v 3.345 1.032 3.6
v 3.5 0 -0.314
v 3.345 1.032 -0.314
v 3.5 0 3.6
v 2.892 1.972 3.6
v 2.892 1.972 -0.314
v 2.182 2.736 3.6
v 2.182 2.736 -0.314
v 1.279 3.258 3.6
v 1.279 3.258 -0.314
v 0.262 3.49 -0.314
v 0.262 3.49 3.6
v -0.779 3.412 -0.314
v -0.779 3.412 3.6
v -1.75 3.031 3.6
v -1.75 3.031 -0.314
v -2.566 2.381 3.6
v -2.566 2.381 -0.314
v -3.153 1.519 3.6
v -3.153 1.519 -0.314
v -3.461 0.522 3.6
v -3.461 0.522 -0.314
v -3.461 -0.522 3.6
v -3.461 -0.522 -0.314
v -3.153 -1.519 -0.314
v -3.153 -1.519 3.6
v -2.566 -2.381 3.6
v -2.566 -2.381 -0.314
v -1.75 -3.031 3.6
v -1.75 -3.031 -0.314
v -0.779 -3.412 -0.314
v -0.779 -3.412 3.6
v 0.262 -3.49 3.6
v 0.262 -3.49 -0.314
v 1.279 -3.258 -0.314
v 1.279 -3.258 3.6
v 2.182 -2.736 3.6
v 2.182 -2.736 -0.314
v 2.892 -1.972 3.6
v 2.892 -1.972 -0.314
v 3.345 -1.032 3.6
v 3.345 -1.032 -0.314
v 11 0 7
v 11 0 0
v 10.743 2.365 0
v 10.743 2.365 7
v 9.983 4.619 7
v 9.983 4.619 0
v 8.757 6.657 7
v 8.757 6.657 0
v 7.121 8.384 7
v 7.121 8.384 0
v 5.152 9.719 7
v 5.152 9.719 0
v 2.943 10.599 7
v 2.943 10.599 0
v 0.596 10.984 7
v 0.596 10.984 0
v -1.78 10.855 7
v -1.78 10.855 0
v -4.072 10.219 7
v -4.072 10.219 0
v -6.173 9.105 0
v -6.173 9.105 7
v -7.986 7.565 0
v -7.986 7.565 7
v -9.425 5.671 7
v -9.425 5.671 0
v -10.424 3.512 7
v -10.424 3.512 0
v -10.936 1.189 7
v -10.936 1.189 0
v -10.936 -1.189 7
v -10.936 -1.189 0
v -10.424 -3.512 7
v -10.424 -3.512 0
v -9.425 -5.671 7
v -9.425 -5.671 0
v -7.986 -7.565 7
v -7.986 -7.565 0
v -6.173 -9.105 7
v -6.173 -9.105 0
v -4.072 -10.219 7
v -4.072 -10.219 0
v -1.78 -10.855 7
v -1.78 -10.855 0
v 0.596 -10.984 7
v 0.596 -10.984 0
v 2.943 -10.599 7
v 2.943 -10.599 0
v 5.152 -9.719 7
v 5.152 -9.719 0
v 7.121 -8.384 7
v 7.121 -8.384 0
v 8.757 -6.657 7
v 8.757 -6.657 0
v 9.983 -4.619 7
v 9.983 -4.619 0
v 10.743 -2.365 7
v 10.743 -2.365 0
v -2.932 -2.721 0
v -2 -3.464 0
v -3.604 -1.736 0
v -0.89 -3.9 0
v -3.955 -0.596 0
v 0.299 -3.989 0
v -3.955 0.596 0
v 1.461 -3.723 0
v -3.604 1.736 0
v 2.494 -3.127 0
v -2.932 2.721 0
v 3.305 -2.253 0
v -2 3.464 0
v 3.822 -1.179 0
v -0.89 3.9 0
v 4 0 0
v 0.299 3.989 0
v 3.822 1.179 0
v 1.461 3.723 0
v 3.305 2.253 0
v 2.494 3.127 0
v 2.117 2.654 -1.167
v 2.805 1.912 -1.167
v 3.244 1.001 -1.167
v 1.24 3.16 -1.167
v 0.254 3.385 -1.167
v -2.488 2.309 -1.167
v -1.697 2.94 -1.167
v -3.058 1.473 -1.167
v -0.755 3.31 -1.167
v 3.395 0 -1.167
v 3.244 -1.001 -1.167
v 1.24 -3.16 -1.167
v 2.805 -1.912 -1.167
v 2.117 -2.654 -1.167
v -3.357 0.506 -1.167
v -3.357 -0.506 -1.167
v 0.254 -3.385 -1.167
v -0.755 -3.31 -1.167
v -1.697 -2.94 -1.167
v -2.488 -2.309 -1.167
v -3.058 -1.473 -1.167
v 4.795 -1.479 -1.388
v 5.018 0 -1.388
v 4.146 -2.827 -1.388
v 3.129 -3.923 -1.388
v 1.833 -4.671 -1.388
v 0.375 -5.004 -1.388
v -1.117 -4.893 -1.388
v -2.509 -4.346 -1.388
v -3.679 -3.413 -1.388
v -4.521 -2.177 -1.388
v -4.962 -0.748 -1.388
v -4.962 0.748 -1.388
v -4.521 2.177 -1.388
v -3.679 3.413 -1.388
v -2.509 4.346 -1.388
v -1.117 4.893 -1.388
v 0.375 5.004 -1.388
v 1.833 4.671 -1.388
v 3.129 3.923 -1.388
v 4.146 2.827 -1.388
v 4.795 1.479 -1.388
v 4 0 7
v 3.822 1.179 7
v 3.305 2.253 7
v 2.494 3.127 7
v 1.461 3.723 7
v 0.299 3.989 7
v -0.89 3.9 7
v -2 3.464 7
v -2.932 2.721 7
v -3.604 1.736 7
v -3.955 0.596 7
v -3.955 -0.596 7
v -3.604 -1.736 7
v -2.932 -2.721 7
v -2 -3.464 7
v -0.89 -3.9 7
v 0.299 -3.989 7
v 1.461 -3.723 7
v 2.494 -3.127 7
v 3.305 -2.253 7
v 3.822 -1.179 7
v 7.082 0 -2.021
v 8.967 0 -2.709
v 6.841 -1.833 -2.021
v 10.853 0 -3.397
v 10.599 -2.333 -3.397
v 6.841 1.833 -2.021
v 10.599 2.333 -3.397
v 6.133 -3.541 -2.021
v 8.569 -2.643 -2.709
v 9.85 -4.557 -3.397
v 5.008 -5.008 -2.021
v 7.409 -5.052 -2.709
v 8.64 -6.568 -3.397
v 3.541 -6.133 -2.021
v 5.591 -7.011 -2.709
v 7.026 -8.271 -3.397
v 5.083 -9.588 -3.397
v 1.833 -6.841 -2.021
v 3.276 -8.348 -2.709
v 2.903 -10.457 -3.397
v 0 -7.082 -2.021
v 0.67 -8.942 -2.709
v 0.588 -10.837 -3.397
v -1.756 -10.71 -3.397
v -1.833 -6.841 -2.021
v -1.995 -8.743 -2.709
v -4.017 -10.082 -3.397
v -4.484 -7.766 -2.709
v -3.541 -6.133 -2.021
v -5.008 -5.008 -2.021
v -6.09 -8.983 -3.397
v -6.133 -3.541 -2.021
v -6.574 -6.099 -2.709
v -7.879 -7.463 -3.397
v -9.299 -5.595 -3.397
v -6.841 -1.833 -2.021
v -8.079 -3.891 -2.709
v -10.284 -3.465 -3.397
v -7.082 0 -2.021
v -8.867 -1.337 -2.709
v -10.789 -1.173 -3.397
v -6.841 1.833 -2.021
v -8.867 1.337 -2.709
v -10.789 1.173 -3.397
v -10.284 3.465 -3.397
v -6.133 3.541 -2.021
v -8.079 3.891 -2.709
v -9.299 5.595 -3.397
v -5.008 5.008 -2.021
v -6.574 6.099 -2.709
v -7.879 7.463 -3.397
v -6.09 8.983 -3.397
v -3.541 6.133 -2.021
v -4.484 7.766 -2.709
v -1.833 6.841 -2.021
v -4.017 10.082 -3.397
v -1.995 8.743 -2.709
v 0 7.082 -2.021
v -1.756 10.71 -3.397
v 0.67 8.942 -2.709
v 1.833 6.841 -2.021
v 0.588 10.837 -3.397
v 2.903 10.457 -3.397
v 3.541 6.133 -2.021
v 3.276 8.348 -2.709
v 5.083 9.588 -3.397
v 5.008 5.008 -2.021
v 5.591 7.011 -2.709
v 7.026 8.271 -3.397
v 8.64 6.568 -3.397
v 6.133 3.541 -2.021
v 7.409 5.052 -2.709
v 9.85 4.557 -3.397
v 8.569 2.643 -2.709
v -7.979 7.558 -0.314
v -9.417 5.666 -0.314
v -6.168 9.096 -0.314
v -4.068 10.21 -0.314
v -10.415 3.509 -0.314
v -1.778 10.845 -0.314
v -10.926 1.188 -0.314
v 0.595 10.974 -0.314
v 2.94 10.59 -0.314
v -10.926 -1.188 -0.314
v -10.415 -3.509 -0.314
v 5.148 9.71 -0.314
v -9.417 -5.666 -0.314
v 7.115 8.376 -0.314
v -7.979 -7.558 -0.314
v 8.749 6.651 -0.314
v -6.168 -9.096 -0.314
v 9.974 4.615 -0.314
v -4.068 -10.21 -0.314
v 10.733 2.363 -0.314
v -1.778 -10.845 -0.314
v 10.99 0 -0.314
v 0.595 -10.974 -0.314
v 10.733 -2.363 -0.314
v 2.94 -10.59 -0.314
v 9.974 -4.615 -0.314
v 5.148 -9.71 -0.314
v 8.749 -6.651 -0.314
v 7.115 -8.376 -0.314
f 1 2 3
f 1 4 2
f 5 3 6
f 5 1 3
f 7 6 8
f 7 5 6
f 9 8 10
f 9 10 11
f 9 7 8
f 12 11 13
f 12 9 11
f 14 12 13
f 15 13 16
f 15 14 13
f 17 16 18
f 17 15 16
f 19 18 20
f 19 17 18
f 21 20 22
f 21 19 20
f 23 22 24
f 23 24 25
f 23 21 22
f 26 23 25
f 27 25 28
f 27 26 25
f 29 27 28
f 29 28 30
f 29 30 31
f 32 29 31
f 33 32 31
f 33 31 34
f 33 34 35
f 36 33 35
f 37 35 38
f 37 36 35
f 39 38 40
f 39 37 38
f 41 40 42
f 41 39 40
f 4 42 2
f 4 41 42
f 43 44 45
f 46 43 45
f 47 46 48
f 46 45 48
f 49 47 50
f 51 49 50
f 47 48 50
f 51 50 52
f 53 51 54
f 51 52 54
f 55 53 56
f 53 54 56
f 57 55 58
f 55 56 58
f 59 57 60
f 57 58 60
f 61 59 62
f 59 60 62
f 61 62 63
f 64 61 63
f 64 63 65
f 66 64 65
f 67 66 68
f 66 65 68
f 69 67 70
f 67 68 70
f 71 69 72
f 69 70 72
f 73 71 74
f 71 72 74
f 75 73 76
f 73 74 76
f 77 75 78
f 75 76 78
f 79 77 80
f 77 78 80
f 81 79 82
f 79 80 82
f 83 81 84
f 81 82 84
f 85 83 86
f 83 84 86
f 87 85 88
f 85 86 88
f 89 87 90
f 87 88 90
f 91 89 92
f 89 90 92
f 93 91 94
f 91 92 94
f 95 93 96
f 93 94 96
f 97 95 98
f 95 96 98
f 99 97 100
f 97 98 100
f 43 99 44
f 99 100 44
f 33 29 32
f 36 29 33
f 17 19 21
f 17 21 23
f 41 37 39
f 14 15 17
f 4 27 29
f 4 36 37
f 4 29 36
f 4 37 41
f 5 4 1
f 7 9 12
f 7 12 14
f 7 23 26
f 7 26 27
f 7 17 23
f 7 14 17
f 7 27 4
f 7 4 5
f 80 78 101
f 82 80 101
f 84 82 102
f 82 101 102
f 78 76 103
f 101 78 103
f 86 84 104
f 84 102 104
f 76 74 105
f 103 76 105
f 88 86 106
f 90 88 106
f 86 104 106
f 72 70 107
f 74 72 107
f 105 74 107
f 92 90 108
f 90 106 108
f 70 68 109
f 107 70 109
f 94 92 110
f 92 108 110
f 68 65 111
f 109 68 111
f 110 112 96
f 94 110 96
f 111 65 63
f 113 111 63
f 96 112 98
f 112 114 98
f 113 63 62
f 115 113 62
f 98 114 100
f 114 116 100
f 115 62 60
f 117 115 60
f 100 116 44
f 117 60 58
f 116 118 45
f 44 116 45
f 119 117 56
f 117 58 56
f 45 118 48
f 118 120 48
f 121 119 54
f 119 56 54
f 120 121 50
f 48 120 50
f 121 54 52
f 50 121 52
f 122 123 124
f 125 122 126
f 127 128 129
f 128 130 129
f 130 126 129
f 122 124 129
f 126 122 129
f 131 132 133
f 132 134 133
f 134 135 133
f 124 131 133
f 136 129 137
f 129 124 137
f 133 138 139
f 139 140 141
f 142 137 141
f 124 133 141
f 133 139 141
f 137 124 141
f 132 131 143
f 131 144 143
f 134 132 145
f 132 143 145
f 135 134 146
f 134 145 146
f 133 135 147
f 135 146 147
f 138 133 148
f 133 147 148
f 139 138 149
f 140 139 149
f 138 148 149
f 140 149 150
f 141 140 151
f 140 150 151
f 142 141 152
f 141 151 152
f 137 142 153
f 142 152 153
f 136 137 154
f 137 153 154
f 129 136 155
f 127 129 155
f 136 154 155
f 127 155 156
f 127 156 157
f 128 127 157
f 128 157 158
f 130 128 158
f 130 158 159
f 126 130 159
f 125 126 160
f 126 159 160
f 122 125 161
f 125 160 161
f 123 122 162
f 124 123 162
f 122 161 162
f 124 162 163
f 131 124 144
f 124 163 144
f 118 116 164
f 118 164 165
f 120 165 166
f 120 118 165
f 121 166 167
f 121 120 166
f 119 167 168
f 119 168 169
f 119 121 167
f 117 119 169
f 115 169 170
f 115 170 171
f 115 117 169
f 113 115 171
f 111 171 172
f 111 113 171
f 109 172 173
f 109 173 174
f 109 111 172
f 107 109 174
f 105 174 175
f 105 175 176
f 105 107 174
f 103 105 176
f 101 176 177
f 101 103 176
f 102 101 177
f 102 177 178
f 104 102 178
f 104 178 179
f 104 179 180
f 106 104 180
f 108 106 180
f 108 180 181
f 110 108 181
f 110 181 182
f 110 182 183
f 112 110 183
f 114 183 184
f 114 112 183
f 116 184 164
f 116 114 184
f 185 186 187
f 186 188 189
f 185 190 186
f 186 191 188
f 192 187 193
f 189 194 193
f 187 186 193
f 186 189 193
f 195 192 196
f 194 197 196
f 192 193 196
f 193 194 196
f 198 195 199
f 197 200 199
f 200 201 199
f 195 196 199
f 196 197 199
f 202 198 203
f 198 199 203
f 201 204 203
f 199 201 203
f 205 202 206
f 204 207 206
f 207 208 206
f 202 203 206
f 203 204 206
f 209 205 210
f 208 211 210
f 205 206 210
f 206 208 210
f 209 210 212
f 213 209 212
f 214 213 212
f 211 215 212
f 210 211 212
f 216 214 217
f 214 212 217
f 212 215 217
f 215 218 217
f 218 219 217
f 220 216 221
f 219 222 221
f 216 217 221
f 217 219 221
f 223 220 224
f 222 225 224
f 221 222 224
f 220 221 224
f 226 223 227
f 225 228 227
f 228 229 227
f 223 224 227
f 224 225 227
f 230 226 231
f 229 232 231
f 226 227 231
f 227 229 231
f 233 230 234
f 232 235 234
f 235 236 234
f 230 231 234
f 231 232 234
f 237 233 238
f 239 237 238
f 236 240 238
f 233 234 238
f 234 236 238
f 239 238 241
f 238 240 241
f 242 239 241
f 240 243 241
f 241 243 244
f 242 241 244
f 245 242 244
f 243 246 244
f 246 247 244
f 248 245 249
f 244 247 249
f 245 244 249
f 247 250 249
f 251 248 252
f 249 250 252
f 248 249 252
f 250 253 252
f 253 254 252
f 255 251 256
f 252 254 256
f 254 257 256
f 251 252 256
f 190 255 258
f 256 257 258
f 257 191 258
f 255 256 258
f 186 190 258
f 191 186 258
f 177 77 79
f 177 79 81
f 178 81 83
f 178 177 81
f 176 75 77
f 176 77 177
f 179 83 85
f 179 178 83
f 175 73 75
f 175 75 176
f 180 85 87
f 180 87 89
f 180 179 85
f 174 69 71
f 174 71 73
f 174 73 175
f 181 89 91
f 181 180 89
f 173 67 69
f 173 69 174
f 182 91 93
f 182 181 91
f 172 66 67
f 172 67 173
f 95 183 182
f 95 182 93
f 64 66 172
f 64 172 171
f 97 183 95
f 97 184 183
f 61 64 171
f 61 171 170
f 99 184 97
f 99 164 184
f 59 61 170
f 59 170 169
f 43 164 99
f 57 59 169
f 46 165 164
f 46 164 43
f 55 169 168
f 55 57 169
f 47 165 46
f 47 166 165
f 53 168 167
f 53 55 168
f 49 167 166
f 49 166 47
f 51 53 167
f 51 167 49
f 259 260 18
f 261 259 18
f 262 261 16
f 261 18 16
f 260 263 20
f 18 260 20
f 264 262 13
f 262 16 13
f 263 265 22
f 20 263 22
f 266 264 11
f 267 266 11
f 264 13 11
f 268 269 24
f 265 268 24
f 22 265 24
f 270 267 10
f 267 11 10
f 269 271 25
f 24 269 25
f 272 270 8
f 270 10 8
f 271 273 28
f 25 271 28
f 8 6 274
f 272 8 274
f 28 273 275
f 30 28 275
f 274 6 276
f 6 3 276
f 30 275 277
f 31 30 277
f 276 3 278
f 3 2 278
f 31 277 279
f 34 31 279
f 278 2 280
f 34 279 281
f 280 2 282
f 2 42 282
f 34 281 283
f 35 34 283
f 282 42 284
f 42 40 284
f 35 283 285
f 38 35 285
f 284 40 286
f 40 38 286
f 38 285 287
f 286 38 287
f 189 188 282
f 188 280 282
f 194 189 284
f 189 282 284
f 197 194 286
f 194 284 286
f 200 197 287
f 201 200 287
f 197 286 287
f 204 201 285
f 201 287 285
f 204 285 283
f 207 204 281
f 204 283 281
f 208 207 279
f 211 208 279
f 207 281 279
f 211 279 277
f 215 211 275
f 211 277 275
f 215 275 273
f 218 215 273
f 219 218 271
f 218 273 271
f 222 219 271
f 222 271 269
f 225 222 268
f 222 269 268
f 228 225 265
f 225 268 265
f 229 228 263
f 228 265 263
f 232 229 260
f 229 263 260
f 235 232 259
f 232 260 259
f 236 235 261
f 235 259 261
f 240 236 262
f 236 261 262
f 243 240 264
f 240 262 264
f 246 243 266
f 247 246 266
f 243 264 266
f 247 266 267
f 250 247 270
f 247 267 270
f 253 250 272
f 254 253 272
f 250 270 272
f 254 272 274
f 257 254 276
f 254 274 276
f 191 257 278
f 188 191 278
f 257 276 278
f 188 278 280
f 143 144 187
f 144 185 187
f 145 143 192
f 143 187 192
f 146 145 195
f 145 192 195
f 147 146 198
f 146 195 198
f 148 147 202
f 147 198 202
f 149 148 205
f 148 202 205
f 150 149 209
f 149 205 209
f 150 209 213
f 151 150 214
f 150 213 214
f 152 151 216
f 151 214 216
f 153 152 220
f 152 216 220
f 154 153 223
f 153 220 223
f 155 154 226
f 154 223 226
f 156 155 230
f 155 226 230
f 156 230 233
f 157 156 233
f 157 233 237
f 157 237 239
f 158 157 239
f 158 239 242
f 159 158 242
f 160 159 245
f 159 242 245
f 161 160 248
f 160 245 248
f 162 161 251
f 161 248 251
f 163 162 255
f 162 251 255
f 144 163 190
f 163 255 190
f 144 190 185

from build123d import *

# Parameters (mm, degrees)
F0_R      = 11
F0_R_2    = 4
F1_DEPTH  = 7
F2_R      = 40
F2_R_2    = 11.5
F3_DEPTH  = 7
F4_R      = 11.5
F5_DEPTH  = 25
F7_R      = 3.5
F8_DEPTH  = 3.6
F11_DEPTH = 4.81
F13_DEPTH = 1


with BuildPart() as f1:
    # F0 (on Top) → F1 (new body)
    with BuildSketch(Plane.XY):
        Circle(F0_R)
        Circle(F0_R_2, mode=Mode.SUBTRACT)
    extrude(amount=F1_DEPTH)


with BuildPart() as f3:
    # F2 (on Top) → F3 (new body)
    with BuildSketch(Plane.XY):
        Circle(F2_R)
        Circle(F2_R_2, mode=Mode.SUBTRACT)
    extrude(amount=F3_DEPTH)

    # F4 (on face) → F5 (cut)
    with BuildSketch(Plane.XY.offset(7)):
        with Locations((0, 26.6484025971)):
            Circle(F4_R)
    extrude(amount=-F5_DEPTH, mode=Mode.SUBTRACT)


with BuildPart() as f8:
    # F7 (on Top) → F8 (new body)
    with BuildSketch(Plane.XY):
        Circle(F7_R)
    extrude(amount=F8_DEPTH)


with BuildPart() as f10:
    # F9 (on Front) → F10 (revolve)
    with BuildSketch(Plane.XZ):
        Polygon((10.9253358096, -2.6480713859), (10.9253358096, -0.2235482534), (0, 0), (0, -1.2938332511), (3.6954516545, -1.2719907099), (7.2557874955, -1.5996290604), (9.0250344947, -1.8180545885), (10.1826898754, -2.276748186), align=None)
    revolve(axis=Axis((0, 0, -0.6469166256), (0, 0, -1)))


with BuildPart() as f11:
    # F11 (new): a face of the model
    f11_faces = [f8.part.faces().sort_by_distance(p)[0] for p in [
        (0, 0, 3.6),
    ]]
    extrude(f11_faces, amount=-F11_DEPTH)


with BuildPart() as f8_1:
    add(f8.part)

    # F13 (add): a face of the model
    f13_faces = [f8_1.faces().sort_by_distance(p)[0] for p in [
        (0, 0, 0),
    ]]
    extrude(f13_faces, amount=F13_DEPTH)

    # F14 (on Front) → F15 (revolve)
    with BuildSketch(Plane.XZ):
        Polygon((10.8525427058, -3.3965536859), (10.9901418909, -0.3143260838), (0, -0.3143260838), (0, -1.1674426496), (3.3946528565, -1.1674426496), (5.0183264539, -1.3876017183), (7.0823179558, -2.0205592737), align=None)
    revolve(axis=Axis((0, 0, -0.7408843667), (0, 0, -1)))


solid = Compound([f1.part, f8_1.part])
